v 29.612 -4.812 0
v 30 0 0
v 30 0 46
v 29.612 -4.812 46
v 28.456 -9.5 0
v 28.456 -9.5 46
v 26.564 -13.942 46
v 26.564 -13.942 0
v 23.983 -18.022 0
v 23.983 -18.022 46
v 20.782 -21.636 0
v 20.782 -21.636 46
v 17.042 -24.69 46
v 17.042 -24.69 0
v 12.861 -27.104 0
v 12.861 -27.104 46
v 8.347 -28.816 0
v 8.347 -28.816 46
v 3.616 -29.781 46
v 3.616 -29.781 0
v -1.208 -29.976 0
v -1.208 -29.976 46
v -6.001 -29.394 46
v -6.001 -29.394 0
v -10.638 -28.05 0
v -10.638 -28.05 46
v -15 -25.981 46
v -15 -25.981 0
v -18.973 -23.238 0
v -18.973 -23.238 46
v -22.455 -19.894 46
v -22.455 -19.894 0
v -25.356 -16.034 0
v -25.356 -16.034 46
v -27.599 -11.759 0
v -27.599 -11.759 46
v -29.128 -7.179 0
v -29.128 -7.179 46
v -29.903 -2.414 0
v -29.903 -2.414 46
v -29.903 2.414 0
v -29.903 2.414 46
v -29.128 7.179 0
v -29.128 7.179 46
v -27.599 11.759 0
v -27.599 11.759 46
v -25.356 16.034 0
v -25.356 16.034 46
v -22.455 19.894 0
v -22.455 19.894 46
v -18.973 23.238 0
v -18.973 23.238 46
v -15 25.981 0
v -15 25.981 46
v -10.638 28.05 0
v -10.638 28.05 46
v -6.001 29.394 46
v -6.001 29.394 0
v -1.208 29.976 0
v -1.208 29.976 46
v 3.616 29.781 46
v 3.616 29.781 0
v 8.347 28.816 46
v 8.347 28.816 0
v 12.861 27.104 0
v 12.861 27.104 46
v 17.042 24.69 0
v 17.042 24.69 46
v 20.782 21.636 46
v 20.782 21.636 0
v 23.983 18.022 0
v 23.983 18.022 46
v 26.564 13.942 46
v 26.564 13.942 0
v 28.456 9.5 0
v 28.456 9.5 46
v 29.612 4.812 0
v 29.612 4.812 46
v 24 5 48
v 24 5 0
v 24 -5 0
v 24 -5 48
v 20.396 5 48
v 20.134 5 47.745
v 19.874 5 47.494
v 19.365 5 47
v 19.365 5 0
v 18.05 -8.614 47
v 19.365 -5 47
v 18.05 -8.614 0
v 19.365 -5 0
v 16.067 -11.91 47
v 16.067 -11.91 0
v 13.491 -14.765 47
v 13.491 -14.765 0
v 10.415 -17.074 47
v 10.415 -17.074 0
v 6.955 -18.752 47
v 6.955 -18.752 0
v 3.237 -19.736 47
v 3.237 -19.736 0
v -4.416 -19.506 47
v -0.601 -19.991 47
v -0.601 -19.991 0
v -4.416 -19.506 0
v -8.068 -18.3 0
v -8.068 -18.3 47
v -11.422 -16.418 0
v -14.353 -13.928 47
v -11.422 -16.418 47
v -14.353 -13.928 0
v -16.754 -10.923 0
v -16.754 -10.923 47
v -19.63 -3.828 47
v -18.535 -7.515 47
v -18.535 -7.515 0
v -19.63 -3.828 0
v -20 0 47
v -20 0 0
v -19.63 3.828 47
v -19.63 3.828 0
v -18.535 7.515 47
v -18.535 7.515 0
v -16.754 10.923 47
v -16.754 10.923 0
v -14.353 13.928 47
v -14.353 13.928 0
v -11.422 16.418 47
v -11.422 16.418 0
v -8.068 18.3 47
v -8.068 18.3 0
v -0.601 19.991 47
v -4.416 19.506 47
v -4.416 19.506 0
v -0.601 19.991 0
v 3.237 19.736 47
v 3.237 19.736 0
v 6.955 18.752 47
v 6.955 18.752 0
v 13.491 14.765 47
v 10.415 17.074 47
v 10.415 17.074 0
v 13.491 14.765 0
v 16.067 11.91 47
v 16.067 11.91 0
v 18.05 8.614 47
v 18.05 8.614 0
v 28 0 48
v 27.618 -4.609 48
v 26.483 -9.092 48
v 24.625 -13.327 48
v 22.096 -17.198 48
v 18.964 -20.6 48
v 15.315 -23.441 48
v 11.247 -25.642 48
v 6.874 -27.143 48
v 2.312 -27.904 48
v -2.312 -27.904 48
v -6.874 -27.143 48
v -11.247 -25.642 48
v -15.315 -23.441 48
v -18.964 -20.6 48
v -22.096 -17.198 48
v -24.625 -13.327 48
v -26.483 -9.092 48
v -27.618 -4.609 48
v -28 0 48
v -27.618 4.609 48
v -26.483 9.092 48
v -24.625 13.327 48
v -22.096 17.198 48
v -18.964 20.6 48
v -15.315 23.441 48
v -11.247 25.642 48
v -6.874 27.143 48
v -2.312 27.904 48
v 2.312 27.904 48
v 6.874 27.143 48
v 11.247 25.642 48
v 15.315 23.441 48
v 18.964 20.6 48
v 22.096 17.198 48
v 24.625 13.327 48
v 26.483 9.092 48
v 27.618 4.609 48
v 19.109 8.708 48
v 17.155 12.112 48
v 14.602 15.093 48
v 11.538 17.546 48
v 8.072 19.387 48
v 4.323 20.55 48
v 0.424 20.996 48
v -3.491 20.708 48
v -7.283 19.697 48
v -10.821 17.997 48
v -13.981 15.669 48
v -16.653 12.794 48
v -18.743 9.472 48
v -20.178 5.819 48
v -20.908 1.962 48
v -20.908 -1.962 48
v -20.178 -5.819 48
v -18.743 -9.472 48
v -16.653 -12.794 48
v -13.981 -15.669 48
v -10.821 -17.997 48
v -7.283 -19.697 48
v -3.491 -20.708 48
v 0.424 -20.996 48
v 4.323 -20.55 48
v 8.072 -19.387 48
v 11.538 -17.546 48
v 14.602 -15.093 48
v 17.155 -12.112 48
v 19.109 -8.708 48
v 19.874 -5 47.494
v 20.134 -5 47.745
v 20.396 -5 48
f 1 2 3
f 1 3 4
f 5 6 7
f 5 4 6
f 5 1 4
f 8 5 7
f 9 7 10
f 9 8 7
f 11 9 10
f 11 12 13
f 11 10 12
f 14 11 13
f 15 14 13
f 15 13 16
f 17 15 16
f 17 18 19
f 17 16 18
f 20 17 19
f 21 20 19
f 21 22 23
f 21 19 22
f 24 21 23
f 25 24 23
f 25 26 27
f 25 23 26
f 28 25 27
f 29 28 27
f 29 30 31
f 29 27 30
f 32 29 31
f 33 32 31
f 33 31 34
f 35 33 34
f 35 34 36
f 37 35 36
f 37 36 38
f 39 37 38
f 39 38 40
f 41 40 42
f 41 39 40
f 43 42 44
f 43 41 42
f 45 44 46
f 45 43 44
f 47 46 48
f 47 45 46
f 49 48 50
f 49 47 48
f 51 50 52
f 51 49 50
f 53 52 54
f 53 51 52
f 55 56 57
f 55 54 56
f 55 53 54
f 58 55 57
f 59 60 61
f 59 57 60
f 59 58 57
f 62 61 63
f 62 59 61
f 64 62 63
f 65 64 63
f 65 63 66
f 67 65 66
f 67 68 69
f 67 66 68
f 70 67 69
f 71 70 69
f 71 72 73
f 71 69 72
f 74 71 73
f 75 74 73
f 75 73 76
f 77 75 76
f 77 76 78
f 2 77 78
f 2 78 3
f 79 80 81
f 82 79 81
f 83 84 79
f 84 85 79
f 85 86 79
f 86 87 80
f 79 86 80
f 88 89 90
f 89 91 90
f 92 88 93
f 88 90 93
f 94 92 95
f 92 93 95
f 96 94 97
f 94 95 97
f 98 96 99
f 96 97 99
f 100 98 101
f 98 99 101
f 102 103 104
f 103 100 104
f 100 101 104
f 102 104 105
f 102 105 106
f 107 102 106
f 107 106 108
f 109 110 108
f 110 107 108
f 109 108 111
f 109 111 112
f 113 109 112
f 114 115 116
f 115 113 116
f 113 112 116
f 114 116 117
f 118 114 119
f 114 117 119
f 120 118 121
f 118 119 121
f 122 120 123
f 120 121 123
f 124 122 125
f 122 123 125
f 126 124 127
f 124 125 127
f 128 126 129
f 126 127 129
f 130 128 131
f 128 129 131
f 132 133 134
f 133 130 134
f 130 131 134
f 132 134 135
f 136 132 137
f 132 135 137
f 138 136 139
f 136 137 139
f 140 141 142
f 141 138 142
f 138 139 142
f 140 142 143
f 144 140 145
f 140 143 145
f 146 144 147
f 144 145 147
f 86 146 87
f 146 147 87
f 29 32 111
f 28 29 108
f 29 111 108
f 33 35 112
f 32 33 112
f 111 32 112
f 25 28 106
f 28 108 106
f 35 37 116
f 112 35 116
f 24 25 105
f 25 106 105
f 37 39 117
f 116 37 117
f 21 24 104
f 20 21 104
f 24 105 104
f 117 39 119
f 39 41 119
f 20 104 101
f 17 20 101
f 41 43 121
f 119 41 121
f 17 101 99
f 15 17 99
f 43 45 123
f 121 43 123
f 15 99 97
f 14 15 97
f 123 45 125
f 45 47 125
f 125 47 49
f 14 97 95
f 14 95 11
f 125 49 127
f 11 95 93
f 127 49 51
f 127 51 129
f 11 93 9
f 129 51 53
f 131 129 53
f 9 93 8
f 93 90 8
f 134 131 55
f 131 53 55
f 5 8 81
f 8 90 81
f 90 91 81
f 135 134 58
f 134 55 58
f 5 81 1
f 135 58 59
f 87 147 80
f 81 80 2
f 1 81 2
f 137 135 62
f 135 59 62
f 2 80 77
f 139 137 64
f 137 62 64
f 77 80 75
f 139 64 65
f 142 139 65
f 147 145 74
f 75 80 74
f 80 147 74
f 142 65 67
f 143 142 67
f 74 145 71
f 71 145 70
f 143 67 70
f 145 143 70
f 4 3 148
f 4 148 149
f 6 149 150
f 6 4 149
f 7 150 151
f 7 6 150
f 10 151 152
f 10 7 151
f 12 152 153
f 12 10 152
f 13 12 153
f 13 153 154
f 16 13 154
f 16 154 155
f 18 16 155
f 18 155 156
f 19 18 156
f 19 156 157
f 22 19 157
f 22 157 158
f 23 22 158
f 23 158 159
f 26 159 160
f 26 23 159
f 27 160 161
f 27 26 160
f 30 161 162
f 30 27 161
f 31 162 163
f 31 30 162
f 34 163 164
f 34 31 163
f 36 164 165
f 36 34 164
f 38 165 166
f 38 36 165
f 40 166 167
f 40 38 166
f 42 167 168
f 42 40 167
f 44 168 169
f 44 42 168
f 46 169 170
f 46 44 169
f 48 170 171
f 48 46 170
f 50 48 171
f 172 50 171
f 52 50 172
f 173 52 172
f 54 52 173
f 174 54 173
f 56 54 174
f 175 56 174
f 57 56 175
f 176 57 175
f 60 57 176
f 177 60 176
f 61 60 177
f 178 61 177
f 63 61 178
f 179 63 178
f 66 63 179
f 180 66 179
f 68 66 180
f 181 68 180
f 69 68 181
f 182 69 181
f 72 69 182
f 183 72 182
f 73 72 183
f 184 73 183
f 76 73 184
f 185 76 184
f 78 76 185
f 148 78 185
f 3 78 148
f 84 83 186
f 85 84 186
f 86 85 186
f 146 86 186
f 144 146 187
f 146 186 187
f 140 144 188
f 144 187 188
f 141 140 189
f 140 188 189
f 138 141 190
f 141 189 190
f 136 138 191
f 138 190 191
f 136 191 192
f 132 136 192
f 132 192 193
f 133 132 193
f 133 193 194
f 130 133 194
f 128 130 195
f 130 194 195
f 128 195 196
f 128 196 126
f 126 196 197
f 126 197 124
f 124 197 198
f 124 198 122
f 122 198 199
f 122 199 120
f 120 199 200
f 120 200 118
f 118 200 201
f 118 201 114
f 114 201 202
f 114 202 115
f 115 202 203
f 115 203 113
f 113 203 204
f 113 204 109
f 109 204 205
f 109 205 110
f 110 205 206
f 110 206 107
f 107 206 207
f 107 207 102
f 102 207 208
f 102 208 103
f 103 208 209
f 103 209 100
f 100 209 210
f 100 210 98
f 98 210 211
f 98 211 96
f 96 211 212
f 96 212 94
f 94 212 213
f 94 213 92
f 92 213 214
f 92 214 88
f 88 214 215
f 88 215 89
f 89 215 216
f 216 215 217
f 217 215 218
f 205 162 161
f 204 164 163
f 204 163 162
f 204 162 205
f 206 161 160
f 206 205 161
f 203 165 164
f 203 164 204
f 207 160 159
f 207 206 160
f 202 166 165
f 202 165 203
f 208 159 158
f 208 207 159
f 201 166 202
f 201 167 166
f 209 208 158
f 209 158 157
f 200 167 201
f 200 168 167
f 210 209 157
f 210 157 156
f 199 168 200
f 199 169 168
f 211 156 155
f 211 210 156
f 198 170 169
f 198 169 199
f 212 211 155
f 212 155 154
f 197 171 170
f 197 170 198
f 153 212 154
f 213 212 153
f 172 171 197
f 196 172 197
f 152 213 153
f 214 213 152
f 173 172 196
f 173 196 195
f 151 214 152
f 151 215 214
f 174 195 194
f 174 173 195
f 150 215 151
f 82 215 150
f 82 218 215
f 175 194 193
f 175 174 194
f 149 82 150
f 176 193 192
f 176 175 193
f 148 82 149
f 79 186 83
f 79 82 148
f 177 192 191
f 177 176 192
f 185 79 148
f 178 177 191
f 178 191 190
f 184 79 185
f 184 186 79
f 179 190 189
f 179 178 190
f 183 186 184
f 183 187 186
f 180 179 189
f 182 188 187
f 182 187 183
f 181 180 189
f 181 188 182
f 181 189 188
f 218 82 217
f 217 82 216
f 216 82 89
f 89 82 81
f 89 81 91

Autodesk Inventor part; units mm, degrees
ref_plane "YZ Plane" through (0, 0, 0) normal (1, 0, 0) x (0, 1, 0)
ref_plane "XZ Plane" through (0, 0, 0) normal (0, 1, 0) x (-1, 0, 0)
ref_plane "XY Plane" through (0, 0, 0) normal (0, 0, 1) x (1, 0, 0)
ref_plane "Płaszczyzna konstrukcyjna1" through (0, 0, 0) normal (0, 0, 1) x (1, 0, 0)
sketch "Szkic1" plane through (0, 0, 0) normal (0, 0, 1) x (1, 0, 0)
  arc A0 (19.3649, 5) -> (19.3649, -5) centre (0, 0) ccw projected
  line L0 (19.3649, 5) -> (24, 5) projected
  line L1 (24, 5) -> (24, -5) projected
  line L2 (24, -5) -> (19.3649, -5) projected
  circle A1 centre (0, 0) radius 30
  dimension "d0" = 60
extrude "Wyciągnięcie proste1" add sketch "Szkic1" along normal blind 48
chamfer "Faza1" distance 2 angle 45 1 edges at (-30, 0, 48)
chamfer "Faza2" distance 1 angle 45 1 edges at (-20, 0, 48)
properties material "Stal nierdzewna"
